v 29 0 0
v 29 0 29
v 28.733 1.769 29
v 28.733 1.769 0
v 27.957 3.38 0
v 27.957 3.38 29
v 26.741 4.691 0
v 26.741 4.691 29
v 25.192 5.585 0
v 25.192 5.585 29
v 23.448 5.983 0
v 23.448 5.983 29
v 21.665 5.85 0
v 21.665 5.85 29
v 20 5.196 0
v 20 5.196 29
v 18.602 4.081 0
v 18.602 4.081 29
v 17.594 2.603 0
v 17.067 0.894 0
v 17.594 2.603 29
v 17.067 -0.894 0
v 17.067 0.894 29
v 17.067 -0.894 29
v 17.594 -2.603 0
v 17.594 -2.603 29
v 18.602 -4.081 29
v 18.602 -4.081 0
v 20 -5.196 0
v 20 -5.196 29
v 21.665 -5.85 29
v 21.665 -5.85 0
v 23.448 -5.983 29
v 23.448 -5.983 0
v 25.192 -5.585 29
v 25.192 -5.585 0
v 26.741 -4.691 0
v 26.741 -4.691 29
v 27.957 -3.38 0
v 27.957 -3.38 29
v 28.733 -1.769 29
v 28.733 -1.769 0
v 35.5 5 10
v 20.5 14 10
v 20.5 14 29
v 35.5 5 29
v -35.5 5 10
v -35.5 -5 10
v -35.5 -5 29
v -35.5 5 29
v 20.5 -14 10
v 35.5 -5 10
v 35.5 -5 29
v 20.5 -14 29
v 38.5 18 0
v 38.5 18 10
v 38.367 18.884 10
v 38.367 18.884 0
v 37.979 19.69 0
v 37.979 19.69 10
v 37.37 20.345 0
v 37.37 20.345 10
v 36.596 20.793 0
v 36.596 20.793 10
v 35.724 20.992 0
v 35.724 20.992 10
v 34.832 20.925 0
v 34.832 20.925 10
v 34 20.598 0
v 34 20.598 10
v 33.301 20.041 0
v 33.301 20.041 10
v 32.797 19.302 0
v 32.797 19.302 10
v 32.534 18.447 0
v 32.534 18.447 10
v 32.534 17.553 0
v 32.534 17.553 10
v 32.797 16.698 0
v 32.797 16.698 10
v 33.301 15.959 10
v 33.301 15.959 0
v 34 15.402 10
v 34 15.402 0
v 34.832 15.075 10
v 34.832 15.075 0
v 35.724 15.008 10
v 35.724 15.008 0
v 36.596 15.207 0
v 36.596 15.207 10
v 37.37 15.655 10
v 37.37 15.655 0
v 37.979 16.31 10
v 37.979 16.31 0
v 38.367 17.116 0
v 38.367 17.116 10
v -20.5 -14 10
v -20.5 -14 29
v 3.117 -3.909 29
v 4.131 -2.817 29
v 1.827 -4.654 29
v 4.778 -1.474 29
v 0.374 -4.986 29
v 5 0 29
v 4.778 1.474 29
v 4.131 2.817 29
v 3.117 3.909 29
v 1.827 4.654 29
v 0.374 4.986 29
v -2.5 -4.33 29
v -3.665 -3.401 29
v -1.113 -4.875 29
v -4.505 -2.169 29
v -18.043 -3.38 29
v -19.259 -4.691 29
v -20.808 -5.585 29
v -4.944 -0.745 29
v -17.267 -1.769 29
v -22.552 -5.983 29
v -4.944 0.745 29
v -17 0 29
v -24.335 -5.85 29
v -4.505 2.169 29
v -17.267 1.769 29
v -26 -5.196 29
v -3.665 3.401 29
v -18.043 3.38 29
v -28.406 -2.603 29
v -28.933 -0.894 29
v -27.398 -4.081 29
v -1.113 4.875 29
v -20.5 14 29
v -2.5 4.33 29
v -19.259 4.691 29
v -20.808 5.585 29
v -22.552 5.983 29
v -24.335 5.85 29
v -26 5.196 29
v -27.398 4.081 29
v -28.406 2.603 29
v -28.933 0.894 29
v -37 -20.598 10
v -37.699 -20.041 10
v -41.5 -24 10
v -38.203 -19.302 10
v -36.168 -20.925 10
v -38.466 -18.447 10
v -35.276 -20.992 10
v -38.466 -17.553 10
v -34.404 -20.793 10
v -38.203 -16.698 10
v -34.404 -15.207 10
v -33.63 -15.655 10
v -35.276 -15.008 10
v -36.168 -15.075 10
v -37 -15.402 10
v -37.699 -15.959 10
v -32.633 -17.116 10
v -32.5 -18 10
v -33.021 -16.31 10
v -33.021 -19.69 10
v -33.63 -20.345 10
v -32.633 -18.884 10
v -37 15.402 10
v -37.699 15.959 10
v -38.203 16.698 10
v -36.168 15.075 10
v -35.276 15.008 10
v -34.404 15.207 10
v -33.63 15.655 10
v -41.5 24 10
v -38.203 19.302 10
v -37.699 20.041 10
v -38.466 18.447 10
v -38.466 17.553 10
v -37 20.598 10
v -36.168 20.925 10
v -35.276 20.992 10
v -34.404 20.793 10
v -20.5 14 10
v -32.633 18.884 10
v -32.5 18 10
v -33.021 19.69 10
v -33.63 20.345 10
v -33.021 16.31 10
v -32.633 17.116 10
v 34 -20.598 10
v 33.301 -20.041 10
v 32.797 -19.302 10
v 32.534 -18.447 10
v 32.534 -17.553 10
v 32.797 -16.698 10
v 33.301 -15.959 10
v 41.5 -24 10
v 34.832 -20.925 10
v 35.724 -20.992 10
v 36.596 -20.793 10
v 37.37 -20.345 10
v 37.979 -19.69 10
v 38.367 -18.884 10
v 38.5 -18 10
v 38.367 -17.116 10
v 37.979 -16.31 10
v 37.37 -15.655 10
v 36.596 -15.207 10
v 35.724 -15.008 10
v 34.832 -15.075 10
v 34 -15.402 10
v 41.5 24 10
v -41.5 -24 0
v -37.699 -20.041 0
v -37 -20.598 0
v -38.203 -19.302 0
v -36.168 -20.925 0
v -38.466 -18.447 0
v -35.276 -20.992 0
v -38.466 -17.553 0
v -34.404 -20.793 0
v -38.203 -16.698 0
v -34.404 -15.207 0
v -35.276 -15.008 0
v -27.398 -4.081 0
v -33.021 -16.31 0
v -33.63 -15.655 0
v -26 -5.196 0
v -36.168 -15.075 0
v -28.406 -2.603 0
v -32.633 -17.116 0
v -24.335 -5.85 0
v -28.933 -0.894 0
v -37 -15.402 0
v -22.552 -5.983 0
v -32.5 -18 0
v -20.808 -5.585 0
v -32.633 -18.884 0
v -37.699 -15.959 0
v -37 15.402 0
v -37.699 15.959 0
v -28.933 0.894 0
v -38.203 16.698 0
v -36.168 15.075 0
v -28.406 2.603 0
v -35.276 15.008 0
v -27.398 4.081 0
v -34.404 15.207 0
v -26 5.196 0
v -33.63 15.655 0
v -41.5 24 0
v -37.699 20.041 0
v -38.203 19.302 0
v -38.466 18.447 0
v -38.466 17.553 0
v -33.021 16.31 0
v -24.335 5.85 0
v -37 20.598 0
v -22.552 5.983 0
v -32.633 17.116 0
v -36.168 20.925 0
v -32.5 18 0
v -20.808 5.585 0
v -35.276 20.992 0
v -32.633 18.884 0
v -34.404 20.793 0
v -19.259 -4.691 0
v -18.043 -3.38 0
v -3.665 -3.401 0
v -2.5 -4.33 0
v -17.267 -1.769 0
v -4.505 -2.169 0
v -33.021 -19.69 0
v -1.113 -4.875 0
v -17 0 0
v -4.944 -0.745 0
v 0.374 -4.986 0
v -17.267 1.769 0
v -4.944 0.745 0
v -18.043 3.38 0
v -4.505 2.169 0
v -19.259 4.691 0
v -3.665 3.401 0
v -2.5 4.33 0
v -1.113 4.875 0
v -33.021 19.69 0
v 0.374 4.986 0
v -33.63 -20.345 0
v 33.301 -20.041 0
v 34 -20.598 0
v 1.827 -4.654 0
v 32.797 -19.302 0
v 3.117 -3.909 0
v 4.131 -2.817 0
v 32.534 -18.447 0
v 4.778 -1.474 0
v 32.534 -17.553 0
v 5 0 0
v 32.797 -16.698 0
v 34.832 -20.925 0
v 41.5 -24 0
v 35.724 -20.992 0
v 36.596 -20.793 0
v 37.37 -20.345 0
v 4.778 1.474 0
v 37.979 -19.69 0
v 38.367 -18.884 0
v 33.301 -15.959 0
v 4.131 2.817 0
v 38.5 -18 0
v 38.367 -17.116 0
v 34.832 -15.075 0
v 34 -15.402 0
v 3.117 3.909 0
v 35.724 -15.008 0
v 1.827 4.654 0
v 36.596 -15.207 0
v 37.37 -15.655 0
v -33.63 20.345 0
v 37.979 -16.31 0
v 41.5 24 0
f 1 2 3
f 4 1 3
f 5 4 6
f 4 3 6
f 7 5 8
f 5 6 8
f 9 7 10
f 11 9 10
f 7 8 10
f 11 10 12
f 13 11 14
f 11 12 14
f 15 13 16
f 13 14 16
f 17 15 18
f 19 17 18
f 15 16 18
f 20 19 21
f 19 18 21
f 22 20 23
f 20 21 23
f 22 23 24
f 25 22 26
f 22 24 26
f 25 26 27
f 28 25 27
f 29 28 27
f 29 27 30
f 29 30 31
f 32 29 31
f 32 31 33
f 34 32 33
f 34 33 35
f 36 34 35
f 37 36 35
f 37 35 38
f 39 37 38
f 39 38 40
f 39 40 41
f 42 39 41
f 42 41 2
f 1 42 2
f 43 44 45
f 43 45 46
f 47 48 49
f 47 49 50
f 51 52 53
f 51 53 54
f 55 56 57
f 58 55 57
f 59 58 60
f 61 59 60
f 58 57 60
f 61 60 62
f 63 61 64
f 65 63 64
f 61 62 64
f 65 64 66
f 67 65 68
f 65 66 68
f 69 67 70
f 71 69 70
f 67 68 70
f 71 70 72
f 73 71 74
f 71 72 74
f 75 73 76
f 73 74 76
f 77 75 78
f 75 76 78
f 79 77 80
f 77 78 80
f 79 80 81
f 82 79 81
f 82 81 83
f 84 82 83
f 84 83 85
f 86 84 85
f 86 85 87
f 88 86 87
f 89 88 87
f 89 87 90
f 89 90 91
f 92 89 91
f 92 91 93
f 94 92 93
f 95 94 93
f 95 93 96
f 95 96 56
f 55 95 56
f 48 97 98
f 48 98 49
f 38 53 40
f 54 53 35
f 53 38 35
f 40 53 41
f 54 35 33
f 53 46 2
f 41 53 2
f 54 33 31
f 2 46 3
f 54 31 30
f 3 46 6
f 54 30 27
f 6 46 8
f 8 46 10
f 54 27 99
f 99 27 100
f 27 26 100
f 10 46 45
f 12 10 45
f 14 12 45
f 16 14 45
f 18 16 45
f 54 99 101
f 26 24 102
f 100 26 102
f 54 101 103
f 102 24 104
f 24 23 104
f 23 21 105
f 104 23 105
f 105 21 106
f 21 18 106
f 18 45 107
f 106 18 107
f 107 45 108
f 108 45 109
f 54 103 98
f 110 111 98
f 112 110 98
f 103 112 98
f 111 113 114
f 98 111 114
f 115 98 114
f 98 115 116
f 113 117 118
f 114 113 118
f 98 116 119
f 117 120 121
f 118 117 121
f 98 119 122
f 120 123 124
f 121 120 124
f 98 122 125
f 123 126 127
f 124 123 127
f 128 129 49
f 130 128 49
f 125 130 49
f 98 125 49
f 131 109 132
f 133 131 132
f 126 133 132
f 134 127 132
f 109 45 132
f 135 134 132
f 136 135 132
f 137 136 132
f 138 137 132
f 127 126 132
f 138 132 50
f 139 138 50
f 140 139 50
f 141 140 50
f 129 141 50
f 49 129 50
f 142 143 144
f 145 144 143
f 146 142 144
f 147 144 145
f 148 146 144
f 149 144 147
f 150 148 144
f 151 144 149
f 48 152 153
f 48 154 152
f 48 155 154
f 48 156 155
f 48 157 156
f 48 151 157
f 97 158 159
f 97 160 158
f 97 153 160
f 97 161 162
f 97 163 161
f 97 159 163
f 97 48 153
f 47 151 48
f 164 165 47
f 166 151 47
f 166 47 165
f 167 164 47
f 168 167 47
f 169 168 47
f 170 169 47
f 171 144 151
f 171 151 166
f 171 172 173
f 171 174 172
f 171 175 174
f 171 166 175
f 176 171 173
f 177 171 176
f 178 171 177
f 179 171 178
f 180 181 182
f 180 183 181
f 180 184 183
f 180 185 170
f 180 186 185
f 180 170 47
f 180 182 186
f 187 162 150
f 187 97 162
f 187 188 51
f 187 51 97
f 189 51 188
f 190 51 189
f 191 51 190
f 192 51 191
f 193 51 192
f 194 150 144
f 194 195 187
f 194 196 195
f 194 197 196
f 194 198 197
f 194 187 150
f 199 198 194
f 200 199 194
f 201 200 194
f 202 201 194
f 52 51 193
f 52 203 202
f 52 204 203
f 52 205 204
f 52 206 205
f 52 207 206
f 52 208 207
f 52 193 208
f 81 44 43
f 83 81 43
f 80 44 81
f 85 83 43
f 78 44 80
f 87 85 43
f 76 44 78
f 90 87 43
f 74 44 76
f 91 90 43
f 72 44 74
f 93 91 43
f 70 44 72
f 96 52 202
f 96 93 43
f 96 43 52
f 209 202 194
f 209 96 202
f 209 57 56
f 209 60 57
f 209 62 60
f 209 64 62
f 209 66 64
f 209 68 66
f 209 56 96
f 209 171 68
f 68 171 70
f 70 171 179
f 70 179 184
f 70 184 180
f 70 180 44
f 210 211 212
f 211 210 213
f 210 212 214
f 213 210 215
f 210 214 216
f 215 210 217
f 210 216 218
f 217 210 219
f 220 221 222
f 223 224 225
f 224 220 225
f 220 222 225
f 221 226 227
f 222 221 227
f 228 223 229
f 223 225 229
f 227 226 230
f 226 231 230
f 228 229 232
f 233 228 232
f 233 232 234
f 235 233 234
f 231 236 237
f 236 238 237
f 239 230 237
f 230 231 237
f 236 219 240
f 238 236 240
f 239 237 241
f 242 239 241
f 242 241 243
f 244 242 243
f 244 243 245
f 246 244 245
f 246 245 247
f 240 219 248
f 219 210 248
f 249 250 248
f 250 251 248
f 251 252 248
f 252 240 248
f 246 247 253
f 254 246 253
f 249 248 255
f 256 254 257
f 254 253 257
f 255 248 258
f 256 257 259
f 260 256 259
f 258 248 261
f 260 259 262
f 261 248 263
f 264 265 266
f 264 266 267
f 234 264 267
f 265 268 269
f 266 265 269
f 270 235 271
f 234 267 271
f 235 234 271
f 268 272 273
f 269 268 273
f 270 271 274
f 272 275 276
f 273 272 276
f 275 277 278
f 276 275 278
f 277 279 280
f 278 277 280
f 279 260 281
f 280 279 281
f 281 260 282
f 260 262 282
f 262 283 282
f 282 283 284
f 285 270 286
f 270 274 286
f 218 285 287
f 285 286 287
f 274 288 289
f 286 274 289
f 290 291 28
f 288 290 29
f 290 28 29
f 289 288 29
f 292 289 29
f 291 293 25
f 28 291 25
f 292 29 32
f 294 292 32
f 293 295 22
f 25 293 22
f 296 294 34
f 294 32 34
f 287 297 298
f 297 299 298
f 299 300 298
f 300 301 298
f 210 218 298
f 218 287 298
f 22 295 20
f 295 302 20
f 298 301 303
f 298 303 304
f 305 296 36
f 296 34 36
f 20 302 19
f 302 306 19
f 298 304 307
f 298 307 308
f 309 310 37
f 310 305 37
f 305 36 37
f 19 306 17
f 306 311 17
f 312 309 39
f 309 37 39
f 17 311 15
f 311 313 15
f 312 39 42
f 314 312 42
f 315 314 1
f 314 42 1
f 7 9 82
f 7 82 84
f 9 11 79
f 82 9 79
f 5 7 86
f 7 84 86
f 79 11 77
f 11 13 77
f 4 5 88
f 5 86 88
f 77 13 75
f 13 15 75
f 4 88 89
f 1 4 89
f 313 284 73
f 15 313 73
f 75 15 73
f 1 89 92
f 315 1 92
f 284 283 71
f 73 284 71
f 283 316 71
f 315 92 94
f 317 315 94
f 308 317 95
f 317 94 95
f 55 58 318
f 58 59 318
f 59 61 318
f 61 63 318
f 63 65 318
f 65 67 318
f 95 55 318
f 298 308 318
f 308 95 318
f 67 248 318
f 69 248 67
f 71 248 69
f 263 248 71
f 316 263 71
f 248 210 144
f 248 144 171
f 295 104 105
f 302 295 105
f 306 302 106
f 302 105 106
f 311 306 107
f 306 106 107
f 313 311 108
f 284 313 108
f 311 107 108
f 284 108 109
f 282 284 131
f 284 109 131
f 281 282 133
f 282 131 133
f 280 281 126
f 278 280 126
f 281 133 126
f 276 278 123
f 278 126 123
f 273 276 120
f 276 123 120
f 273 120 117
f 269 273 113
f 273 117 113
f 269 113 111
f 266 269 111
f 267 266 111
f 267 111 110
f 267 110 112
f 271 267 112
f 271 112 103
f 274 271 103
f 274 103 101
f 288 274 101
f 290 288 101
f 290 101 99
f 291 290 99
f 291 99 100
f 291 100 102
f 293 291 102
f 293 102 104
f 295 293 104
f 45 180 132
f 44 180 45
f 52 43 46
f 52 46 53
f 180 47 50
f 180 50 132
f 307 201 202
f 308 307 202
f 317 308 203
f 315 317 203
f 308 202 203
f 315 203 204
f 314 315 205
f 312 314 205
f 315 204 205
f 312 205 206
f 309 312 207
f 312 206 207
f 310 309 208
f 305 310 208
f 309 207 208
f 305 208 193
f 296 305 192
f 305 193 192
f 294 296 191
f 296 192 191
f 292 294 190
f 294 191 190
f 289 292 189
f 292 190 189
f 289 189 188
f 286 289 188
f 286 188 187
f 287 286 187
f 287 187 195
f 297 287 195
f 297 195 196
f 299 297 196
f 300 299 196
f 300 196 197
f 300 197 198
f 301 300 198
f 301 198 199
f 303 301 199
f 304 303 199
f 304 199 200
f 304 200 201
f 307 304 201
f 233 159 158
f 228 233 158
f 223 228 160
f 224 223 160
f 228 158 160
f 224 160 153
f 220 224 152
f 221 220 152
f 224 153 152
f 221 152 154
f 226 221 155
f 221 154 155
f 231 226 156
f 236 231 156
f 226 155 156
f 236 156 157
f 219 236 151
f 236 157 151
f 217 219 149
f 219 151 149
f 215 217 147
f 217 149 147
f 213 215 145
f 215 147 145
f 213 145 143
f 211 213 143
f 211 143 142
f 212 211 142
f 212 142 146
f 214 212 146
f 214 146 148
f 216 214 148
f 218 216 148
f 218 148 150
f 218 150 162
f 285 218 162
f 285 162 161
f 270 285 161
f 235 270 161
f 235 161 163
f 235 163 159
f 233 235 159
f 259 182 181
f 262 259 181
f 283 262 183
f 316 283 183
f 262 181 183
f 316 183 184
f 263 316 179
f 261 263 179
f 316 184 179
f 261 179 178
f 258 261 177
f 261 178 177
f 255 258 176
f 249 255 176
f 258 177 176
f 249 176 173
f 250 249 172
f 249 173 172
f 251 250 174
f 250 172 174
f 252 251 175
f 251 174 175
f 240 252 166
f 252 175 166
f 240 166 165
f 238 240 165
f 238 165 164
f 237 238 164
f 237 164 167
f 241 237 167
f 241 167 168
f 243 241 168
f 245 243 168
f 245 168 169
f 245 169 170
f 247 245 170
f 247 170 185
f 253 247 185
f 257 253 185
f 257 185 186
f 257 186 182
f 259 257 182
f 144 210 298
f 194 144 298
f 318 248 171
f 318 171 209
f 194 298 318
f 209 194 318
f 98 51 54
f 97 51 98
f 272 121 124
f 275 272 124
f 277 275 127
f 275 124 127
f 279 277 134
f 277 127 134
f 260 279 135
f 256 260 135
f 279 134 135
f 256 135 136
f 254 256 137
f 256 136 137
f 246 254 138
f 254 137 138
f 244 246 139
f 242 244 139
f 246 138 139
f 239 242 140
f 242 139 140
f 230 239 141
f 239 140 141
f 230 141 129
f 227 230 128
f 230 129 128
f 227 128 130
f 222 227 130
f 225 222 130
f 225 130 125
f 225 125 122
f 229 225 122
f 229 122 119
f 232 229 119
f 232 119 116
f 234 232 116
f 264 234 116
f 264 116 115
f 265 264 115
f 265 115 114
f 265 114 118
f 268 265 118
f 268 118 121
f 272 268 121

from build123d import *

# Parameters (mm, degrees)
SKETCH1_W           = 83
SKETCH1_H           = 48
BOSS_EXTRUDE1_DEPTH = 10
BOSS_EXTRUDE2_DEPTH = 19
SKETCH3_R           = 5
SKETCH3_R_2         = 6
SKETCH3_R_3         = 3
CUT_EXTRUDE1_DEPTH  = 30


with BuildPart() as part:
    # Sketch1 → Boss-Extrude1 (new body)
    with BuildSketch(Plane.XY):
        Rectangle(SKETCH1_W, SKETCH1_H)
    extrude(amount=BOSS_EXTRUDE1_DEPTH)

    # Sketch2 → Boss-Extrude2 (add)
    with BuildSketch(Plane.XY.offset(10)):
        Polygon((-35.5, 5), (-20.5, 14), (20.5, 14), (35.5, 5), (35.5, -5), (20.5, -14), (-20.5, -14), (-35.5, -5), align=None)
    extrude(amount=BOSS_EXTRUDE2_DEPTH)

    # Sketch3 → Cut-Extrude1 (cut, through all)
    with BuildSketch(Plane.XY.offset(29)):
        Circle(SKETCH3_R)
        with Locations((-23, 0)):
            Circle(SKETCH3_R_2)
        with Locations((23, 0)):
            Circle(SKETCH3_R_2)
        with Locations((-35.5, 18)):
            Circle(SKETCH3_R_3)
        with Locations((35.5, 18)):
            Circle(SKETCH3_R_3)
        with Locations((35.5, -18)):
            Circle(SKETCH3_R_3)
        with Locations((-35.5, -18)):
            Circle(SKETCH3_R_3)
    extrude(amount=-CUT_EXTRUDE1_DEPTH, mode=Mode.SUBTRACT)


solid = part.part
